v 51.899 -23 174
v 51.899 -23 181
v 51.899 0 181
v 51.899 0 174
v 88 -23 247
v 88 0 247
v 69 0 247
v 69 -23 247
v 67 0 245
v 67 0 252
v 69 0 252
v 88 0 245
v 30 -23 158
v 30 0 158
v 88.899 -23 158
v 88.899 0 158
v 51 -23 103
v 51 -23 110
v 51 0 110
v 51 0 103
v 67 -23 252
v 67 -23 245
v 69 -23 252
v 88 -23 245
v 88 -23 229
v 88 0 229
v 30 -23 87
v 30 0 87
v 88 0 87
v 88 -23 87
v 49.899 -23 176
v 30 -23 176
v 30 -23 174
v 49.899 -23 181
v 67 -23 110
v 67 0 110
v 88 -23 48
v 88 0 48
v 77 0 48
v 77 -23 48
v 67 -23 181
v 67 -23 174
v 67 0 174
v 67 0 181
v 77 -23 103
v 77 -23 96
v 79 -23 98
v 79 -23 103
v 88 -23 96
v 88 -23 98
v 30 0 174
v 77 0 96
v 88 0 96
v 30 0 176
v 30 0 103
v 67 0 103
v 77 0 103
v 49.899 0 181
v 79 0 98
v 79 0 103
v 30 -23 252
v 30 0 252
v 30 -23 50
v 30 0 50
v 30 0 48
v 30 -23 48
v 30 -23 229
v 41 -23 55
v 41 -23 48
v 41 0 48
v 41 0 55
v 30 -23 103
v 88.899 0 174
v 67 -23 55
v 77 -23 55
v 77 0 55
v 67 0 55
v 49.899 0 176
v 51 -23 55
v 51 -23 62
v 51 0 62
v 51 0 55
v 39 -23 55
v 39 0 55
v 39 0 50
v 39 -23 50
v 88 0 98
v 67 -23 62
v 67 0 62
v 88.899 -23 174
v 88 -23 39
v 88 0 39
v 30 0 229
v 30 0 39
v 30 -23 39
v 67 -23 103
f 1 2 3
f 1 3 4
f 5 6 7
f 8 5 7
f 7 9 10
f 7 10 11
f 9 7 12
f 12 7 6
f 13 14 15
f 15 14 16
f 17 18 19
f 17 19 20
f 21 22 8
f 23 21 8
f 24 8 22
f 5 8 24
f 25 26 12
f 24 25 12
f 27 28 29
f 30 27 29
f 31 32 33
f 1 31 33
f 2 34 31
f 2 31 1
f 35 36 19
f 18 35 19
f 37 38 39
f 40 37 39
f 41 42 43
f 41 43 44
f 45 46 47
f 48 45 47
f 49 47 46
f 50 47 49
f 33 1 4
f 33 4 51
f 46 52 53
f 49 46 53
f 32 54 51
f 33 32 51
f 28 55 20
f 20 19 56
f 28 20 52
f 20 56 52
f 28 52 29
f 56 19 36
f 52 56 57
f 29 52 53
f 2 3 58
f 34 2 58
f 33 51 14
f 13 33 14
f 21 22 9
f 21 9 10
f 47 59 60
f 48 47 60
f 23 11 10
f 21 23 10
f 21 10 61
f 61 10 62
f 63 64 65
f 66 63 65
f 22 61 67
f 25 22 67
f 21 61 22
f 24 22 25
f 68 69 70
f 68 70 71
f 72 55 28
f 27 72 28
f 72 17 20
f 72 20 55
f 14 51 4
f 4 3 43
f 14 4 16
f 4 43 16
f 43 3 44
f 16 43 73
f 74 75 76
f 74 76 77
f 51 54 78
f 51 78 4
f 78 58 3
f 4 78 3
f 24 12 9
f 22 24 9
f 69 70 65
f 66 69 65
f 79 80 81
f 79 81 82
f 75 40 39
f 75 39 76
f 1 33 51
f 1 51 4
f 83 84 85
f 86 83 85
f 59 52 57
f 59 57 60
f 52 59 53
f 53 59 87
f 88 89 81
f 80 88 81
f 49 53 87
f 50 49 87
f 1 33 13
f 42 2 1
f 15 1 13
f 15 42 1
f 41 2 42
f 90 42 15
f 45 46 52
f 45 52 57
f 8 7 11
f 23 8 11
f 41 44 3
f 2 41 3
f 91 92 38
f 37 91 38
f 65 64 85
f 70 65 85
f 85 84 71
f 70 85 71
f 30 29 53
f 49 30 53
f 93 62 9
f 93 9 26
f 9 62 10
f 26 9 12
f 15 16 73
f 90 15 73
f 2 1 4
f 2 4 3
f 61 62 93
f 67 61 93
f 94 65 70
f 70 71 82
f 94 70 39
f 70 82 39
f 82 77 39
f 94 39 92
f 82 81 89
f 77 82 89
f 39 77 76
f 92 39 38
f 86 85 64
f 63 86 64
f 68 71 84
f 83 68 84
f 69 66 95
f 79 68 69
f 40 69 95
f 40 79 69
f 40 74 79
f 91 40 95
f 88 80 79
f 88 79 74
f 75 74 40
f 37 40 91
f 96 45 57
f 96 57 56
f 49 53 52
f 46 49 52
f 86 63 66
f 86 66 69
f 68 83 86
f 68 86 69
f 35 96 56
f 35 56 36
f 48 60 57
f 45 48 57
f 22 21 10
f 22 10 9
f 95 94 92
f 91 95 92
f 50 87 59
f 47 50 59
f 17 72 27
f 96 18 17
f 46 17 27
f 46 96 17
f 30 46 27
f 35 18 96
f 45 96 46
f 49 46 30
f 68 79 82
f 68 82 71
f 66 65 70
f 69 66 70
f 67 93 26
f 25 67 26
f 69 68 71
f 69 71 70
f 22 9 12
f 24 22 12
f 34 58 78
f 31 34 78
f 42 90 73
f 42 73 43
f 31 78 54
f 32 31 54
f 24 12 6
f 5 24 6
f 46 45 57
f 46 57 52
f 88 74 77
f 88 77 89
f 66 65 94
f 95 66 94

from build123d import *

# Parameters (mm, degrees)
F4_DEPTH = 23
F5_DEPTH = 23


# Not quite as in the source:
# - a feature names something its author has since deleted; it is built from what else it names


with BuildPart() as f4:
    # F2 (on Front) → F4 (new body)
    with BuildSketch(Plane.XZ):
        Polygon((67, 181), (51.8985245079, 181), (51.8985245079, 174), (30, 174), (30, 158), (88.8985245079, 158), (88.8985245079, 174), (67, 174), align=None)
    extrude(amount=F4_DEPTH)


with BuildPart() as f4b:
    # F1 (on Front) → F4, piece 2 (new body)
    with BuildSketch(Plane.XZ):
        Polygon((67, 252), (30, 252), (30, 229), (88, 229), (88, 245), (67, 245), align=None)
    extrude(amount=F4_DEPTH)


with BuildPart() as f4c:
    # F3 (on Front) → F4, piece 3 (new body)
    with BuildSketch(Plane.XZ):
        Polygon((67, 110), (51, 110), (51, 103), (41, 103), (30, 103), (30, 96), (30, 87), (88, 87), (88, 96), (77, 96), (77, 103), (67, 103), align=None)
    extrude(amount=F4_DEPTH)


with BuildPart() as f4d:
    # F3 (on Front) → F4, piece 4 (new body)
    with BuildSketch(Plane.XZ):
        Polygon((51, 55), (41, 55), (41, 48), (30, 48), (30, 39), (88, 39), (88, 48), (77, 48), (77, 55), (67, 55), (67, 62), (51, 62), align=None)
    extrude(amount=F4_DEPTH)


with BuildPart() as f5:
    # F2 (on Front) → F5 (new body)
    with BuildSketch(Plane.XZ):
        Polygon((51.8985245079, 181), (49.8985245079, 181), (49.8985245079, 176), (30, 176), (30, 174), (51.8985245079, 174), align=None)
    extrude(amount=F5_DEPTH)


with BuildPart() as f5b:
    # F3 (on Front) → F5, piece 2 (new body)
    with BuildSketch(Plane.XZ):
        Polygon((79, 103), (77, 103), (77, 96), (88, 96), (88, 98), (79, 98), align=None)
    extrude(amount=F5_DEPTH)


with BuildPart() as f5c:
    # F3 (on Front) → F5, piece 3 (new body)
    with BuildSketch(Plane.XZ):
        Polygon((41, 48), (41, 55), (39, 55), (39, 50), (30, 50), (30, 48), align=None)
    extrude(amount=F5_DEPTH)


with BuildPart() as f5d:
    # F1 (on Front) → F5, piece 4 (new body)
    with BuildSketch(Plane.XZ):
        Polygon((69, 252), (67, 252), (67, 245), (88, 245), (88, 247), (69, 247), align=None)
    extrude(amount=F5_DEPTH)


solid = Compound([f4.part, f4b.part, f4c.part, f4d.part, f5.part, f5b.part, f5c.part, f5d.part])
